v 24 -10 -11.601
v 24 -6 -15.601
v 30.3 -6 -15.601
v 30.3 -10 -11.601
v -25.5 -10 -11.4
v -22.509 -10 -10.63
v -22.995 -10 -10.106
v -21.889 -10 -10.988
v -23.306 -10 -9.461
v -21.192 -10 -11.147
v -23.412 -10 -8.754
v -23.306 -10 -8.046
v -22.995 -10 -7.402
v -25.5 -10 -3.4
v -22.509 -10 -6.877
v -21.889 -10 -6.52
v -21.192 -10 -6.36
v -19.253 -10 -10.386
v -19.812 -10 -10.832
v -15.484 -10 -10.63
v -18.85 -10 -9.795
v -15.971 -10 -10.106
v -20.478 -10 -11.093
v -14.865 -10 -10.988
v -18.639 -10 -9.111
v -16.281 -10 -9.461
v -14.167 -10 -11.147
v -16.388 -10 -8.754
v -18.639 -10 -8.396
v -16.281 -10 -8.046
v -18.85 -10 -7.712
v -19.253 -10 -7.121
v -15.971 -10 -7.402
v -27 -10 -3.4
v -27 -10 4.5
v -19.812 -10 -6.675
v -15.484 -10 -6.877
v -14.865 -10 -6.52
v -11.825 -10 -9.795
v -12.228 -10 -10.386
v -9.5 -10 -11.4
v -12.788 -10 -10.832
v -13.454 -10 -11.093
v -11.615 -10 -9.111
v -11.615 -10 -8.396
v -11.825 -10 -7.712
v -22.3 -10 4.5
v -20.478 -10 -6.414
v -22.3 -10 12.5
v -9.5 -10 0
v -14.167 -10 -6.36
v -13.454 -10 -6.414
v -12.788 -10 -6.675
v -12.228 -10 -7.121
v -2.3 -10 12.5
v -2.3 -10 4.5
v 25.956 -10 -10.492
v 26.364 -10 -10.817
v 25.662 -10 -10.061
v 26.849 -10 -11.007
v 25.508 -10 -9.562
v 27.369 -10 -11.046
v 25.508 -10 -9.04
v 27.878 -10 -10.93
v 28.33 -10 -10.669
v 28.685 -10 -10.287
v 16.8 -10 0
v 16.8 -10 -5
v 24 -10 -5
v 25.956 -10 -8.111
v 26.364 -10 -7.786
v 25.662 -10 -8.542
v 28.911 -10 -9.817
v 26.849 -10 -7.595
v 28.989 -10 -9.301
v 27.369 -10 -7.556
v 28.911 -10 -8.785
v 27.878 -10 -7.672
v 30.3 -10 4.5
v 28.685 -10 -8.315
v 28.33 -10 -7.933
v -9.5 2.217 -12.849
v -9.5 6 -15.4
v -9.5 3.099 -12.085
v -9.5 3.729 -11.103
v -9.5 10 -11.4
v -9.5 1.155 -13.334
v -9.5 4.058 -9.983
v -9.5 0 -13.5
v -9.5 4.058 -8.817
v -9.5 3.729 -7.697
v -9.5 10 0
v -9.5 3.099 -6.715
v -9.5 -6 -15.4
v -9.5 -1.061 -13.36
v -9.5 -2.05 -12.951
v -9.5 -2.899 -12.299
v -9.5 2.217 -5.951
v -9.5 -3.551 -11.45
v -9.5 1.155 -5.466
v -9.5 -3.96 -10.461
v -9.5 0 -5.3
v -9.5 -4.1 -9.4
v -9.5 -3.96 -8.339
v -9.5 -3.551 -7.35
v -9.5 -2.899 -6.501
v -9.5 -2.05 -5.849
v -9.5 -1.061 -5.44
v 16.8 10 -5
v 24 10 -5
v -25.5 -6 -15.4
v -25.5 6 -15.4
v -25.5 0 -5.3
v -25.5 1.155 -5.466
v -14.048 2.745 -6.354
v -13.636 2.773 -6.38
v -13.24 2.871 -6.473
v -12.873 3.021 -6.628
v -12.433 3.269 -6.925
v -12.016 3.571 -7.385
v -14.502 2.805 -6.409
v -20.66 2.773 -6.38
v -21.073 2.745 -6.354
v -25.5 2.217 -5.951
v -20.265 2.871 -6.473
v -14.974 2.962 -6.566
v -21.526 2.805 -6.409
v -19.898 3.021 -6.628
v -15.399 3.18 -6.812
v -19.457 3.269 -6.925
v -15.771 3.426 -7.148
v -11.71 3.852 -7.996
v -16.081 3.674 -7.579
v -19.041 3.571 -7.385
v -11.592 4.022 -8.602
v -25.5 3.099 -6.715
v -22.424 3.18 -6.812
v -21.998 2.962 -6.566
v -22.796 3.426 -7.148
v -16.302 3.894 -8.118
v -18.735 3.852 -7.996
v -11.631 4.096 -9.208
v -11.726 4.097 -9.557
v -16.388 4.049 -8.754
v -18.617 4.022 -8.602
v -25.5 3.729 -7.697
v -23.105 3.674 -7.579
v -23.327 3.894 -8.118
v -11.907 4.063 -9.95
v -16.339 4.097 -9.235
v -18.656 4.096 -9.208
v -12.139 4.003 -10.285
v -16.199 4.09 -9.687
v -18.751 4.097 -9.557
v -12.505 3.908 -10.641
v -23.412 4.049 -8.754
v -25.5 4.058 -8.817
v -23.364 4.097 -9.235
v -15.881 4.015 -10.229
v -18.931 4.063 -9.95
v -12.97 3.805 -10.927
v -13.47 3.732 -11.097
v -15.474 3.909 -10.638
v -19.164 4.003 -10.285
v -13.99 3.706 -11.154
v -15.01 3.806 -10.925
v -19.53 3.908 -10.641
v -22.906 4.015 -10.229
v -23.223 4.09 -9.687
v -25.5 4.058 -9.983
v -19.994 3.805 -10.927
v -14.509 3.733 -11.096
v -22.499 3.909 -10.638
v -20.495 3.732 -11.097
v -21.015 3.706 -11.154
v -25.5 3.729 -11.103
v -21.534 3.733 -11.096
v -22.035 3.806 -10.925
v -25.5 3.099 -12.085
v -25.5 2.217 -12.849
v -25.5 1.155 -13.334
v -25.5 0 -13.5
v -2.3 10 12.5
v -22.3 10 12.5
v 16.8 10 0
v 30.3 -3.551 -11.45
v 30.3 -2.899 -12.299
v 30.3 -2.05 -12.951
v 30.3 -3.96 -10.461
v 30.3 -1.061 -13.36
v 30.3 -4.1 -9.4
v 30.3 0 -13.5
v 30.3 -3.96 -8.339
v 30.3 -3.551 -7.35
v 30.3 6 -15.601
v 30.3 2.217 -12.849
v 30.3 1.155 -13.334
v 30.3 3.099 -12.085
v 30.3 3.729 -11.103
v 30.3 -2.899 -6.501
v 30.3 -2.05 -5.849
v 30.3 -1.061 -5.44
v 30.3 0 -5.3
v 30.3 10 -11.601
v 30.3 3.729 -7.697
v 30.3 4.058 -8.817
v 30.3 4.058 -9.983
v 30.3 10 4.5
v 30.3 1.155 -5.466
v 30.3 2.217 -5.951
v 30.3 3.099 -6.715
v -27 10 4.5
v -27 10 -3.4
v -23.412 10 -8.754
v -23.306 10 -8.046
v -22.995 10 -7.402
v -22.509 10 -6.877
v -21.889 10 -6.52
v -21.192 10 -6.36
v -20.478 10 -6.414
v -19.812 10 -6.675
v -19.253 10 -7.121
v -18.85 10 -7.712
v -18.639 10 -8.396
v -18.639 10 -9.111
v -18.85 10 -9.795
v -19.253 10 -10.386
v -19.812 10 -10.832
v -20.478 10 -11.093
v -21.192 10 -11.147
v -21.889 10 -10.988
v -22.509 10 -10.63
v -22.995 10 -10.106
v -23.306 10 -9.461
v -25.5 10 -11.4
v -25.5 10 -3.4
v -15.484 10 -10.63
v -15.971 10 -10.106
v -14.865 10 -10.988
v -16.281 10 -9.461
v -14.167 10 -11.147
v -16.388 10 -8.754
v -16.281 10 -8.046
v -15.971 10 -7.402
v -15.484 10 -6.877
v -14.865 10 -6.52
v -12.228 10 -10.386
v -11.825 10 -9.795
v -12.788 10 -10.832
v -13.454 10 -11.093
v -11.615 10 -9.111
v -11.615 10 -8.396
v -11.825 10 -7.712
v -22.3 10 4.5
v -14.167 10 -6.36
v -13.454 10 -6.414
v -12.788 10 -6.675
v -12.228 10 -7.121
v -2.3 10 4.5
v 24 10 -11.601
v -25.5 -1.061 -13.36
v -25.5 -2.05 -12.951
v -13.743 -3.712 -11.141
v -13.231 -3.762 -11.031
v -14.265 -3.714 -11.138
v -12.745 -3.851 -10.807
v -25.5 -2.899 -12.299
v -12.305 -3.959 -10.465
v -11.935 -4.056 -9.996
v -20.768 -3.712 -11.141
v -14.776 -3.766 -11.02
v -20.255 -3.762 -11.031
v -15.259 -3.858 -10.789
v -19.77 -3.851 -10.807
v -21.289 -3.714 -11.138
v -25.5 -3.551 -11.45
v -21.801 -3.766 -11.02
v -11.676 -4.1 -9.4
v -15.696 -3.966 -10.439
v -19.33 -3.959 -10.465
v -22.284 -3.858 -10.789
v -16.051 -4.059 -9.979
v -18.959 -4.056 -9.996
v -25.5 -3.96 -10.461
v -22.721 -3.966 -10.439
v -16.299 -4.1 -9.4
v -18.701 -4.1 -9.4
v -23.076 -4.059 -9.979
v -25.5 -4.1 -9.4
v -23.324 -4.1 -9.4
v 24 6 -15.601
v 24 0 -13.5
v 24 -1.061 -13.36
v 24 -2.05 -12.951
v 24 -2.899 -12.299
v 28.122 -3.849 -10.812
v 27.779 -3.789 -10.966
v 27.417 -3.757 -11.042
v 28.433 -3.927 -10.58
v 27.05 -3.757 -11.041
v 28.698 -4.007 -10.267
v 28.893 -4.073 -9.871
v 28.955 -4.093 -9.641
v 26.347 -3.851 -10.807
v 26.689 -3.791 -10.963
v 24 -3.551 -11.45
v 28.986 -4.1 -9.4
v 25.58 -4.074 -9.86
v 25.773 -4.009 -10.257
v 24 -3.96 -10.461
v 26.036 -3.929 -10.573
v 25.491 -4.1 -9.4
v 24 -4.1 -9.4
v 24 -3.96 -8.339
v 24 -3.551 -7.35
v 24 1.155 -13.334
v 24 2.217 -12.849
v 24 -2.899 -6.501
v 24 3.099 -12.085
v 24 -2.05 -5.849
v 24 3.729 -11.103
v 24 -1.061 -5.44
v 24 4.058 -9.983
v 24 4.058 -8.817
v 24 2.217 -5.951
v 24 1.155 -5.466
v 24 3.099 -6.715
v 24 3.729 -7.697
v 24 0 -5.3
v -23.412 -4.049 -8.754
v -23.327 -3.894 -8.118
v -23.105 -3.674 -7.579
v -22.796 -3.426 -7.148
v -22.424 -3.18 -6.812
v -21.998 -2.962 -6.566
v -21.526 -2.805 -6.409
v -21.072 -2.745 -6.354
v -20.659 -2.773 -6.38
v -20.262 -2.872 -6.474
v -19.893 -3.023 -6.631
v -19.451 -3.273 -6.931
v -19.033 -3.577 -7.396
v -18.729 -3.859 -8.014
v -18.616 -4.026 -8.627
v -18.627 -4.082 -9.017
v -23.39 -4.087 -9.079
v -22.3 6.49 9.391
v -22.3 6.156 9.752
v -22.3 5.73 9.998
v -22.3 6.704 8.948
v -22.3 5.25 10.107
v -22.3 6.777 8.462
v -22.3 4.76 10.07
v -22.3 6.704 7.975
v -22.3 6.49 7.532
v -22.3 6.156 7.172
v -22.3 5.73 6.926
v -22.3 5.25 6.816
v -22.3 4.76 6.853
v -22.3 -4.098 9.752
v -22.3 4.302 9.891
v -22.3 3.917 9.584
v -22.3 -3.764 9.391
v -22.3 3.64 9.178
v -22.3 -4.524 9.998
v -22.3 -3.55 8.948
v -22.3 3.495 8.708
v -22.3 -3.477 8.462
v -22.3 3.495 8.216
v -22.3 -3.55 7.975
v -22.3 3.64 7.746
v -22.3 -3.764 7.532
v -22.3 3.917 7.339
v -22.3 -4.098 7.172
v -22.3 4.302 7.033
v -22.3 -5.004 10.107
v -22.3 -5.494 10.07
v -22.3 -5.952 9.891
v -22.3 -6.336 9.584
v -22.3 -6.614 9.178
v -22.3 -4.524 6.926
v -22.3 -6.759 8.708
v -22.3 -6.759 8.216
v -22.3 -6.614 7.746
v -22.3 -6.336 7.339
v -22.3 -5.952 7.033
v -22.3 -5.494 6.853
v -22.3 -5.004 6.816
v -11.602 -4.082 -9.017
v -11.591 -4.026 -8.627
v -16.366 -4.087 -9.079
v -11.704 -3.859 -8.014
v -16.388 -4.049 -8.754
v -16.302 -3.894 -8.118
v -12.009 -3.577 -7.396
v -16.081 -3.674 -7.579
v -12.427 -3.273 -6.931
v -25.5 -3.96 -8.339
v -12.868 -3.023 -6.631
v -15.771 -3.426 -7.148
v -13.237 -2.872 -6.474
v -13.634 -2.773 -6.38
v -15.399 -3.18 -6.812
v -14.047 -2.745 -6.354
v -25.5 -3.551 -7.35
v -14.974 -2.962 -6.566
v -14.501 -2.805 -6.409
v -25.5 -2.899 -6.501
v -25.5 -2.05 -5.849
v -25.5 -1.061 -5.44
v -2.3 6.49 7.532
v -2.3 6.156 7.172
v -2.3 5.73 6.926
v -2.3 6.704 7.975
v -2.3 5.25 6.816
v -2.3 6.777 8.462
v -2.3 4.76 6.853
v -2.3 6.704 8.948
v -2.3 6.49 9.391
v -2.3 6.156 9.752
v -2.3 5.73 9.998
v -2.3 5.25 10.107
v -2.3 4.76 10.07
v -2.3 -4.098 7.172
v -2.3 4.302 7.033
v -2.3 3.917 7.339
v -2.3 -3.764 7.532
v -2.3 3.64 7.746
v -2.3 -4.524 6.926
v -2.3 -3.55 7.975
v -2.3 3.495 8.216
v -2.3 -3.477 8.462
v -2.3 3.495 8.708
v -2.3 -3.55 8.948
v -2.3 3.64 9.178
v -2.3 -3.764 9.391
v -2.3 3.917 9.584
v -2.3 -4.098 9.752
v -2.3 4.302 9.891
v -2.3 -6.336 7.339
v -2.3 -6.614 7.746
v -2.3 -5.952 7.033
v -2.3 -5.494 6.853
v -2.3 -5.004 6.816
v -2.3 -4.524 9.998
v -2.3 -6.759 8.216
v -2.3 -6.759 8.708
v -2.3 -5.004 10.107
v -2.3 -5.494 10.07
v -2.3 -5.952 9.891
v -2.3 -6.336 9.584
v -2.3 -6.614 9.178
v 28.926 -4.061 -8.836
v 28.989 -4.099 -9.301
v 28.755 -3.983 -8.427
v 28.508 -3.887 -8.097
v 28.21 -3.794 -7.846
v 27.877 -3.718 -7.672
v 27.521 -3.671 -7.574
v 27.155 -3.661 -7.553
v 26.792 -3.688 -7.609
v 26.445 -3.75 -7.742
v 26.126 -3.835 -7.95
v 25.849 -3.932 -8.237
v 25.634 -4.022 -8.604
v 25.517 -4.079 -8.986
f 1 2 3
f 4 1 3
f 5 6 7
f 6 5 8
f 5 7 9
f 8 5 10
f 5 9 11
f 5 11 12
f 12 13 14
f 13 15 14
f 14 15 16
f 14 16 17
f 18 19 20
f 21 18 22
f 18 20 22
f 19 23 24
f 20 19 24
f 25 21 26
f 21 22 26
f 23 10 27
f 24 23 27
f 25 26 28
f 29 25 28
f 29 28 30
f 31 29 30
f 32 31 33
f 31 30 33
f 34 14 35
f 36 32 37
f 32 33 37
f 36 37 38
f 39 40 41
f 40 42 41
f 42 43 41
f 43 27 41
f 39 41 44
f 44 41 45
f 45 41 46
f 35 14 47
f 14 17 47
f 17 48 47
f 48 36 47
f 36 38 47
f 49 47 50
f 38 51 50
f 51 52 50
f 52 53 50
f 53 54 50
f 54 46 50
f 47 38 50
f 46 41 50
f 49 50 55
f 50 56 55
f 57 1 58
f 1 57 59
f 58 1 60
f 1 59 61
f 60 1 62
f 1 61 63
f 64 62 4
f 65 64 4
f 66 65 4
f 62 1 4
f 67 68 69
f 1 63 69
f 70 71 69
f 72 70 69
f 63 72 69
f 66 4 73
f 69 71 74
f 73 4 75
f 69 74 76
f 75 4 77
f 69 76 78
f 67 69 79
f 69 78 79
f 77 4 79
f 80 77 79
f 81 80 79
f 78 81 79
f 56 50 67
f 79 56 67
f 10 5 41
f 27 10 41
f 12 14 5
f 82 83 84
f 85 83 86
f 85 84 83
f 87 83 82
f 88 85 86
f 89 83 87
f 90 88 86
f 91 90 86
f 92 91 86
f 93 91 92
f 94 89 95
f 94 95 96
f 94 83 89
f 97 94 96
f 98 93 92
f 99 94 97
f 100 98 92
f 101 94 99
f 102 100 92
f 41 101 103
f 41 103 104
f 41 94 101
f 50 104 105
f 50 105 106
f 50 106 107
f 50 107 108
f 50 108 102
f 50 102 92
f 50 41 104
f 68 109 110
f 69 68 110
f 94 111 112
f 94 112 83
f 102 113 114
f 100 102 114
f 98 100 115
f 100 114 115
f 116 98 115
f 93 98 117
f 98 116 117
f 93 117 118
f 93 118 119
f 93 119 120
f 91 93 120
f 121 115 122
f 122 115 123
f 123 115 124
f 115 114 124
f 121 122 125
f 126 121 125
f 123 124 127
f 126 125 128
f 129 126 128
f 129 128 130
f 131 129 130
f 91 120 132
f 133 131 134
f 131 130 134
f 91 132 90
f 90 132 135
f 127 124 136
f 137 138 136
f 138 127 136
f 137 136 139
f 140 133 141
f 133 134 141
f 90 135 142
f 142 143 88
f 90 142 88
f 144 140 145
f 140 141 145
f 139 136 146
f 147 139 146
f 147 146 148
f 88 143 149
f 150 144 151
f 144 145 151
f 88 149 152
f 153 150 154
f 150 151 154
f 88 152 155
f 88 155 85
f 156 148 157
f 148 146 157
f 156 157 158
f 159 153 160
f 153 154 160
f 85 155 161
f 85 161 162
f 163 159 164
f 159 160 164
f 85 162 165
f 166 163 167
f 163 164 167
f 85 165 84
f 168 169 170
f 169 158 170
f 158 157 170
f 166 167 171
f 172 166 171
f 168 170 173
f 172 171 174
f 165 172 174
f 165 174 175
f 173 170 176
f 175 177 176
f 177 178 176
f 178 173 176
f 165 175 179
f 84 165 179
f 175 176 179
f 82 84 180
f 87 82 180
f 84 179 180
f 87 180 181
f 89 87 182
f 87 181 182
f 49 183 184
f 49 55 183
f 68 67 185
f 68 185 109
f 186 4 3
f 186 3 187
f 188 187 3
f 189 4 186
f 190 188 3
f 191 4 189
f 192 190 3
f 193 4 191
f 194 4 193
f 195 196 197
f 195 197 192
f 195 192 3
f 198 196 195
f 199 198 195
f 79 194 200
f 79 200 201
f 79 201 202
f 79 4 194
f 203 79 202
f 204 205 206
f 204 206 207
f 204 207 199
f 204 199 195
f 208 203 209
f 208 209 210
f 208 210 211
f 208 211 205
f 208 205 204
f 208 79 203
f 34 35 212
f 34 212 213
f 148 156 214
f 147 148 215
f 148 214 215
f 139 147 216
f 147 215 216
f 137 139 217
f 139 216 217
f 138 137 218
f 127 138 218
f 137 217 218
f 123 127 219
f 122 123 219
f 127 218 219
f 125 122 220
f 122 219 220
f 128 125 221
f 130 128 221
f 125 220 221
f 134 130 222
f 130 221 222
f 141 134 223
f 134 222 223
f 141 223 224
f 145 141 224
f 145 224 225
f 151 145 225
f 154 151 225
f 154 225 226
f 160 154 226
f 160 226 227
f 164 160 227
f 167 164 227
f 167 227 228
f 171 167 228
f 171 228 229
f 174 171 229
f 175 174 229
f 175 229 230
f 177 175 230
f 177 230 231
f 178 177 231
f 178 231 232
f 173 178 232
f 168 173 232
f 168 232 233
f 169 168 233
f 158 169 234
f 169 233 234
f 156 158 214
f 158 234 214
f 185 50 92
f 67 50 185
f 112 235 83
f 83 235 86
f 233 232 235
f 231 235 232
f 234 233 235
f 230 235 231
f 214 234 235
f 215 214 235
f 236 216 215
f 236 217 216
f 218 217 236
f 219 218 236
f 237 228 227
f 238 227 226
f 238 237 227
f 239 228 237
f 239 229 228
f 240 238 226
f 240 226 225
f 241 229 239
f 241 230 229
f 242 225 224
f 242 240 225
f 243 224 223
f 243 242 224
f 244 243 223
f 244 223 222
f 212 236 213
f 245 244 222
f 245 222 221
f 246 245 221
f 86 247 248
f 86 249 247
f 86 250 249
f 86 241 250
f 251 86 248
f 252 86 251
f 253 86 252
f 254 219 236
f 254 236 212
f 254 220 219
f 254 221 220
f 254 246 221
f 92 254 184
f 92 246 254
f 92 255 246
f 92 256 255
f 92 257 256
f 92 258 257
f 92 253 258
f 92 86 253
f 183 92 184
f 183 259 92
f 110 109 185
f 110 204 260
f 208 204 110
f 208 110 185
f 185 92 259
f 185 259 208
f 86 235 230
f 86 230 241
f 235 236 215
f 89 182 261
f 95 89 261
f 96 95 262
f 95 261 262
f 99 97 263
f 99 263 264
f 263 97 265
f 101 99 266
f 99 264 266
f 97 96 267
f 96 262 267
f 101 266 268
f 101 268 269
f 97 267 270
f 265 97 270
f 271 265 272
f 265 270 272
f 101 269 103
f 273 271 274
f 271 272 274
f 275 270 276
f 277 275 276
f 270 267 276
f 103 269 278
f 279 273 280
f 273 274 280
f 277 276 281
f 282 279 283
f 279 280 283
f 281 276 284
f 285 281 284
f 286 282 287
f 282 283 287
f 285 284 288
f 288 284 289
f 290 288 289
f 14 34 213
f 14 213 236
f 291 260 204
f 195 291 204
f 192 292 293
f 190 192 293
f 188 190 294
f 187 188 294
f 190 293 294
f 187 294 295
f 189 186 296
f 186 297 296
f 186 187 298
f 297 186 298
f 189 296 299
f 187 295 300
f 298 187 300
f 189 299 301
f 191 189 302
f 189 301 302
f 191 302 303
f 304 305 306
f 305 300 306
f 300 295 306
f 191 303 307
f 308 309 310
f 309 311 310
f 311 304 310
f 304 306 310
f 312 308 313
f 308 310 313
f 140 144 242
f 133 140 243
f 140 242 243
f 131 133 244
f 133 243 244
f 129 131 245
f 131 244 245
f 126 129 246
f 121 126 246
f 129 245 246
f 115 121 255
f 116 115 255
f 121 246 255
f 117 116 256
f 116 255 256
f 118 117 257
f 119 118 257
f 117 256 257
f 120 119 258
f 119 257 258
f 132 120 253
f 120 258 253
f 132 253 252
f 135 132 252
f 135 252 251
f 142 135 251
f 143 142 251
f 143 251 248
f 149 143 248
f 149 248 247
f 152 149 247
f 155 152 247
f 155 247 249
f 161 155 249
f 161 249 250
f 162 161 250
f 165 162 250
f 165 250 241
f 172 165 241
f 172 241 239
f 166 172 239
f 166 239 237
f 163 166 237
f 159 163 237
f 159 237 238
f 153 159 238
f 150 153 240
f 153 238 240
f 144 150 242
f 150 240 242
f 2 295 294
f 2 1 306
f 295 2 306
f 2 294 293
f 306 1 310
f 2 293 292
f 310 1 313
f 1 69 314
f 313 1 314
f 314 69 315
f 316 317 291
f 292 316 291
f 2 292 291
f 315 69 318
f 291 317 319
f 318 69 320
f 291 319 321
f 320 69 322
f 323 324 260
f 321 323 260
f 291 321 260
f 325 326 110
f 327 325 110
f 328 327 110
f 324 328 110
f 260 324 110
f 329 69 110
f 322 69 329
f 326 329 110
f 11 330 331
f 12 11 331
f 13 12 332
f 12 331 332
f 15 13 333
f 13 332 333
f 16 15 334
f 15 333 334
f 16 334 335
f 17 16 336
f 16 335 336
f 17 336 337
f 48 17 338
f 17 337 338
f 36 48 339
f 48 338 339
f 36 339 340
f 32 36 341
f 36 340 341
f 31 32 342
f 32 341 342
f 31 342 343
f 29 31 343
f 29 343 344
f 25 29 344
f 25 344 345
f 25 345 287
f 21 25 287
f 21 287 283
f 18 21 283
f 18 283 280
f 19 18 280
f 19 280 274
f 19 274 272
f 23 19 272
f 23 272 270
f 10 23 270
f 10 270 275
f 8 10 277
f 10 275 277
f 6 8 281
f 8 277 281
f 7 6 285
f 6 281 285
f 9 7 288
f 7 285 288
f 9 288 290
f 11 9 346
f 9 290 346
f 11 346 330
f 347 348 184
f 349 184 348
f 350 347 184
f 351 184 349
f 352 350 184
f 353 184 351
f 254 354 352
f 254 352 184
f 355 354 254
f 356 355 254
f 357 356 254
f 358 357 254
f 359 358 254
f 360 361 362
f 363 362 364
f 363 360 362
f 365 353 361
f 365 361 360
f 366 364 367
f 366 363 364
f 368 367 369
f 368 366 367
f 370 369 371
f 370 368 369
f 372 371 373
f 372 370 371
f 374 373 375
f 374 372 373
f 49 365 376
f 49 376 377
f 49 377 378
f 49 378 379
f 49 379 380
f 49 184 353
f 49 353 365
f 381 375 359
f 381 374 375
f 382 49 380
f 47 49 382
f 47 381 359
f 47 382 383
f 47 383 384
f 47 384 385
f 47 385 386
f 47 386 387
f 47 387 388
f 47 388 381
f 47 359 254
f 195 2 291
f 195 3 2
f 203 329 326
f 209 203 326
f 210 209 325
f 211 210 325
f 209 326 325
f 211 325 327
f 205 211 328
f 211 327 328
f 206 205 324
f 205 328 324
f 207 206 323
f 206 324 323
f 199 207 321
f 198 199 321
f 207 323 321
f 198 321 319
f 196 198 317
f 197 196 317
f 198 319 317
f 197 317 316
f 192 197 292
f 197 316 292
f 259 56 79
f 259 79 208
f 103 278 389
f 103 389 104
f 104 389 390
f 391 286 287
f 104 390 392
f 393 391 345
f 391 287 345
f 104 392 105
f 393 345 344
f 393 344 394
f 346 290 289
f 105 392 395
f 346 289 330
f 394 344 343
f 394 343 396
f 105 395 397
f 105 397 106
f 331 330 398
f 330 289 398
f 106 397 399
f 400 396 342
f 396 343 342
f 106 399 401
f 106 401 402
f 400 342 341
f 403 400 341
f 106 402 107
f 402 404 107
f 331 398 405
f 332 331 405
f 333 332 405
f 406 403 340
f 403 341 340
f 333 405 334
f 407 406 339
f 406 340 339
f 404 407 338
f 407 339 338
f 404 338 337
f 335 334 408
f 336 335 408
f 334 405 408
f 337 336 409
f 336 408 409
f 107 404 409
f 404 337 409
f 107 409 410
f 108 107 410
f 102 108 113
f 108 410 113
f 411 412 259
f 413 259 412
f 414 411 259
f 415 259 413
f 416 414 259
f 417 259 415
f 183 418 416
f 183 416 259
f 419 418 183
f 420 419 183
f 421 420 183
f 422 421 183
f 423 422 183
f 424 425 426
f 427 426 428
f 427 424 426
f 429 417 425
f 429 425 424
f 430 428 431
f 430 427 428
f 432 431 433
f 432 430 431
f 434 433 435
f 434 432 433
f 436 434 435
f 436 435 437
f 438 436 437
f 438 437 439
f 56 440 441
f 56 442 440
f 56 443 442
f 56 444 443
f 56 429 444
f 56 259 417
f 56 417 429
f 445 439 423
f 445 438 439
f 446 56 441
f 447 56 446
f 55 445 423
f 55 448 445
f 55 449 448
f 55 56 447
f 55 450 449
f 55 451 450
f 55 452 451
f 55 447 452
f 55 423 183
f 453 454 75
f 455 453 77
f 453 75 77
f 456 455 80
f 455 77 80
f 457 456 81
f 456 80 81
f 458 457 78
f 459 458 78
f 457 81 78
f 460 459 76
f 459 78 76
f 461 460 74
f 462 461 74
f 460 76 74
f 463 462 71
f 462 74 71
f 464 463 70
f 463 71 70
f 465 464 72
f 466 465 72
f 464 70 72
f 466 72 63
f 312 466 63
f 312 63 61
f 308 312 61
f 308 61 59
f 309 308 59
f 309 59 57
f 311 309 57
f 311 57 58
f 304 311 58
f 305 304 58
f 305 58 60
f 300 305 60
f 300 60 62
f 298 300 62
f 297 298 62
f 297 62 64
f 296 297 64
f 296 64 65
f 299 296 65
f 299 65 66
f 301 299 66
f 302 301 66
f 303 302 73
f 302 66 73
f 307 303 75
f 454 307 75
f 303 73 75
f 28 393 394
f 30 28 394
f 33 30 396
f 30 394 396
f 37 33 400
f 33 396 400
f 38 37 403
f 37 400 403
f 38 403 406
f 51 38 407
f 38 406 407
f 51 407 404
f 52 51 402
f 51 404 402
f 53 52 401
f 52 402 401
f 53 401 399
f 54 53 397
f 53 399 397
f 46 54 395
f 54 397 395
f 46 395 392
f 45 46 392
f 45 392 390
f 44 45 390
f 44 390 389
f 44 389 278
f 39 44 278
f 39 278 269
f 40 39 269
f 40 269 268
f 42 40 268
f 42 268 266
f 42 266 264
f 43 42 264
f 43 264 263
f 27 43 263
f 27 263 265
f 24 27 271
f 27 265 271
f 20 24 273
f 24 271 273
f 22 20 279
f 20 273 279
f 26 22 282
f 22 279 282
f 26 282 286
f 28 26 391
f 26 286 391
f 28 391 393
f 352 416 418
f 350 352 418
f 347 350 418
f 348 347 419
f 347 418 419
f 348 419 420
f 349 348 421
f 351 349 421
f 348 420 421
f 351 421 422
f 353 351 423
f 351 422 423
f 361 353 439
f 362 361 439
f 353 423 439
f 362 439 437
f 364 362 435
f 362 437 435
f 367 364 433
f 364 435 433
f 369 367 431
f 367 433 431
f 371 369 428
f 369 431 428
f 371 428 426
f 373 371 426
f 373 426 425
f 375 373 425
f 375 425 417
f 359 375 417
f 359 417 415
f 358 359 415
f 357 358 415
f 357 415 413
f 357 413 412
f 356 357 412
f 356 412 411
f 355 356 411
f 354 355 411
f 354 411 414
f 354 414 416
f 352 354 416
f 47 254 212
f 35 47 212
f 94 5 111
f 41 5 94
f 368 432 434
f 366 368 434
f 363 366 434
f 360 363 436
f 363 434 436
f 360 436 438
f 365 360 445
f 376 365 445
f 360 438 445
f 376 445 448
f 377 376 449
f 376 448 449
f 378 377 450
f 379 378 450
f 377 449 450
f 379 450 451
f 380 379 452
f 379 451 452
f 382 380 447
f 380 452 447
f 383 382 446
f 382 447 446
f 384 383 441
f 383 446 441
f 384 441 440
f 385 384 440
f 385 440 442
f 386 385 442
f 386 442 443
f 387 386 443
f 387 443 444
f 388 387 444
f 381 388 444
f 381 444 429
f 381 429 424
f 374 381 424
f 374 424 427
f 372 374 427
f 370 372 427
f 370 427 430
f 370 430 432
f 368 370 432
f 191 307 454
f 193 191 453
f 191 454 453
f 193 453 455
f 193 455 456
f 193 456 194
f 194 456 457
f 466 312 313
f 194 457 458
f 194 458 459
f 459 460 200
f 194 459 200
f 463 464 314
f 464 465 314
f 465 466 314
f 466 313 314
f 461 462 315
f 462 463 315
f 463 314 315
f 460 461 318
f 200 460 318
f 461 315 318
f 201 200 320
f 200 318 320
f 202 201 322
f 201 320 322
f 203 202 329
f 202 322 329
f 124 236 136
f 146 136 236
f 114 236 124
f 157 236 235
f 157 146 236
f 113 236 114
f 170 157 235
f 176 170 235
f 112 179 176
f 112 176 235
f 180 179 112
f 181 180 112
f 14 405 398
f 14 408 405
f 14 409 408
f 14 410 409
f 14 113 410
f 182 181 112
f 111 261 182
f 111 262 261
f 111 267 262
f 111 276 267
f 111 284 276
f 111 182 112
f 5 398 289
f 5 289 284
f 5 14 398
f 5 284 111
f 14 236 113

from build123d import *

# Parameters (mm, degrees)
F1_DEPTH      = 10
F2_SIZE       = 4
F4_W          = 20
F4_H          = 20.101140447
F5_DEPTH      = 3.3
F5_DEPTH_BACK = 3
F6_DEPTH      = 84
F7_SIZE       = 4
F8_R          = 1.75
F9_DEPTH      = 8.7
F10_R         = 1.65
F11_DEPTH     = 66.9
F12_R         = 2.4
F13_DEPTH     = 25


with BuildPart() as f1:
    # F0 (on Front) → F1 (new body, symmetric)
    with BuildSketch(Plane.XZ):
        Polygon((-22.3, 4.5), (-27, 4.5), (-27, -3.4), (-25.5, -3.4), (-25.5, -15.4), (-9.5, -15.4), (-9.5, 0), (16.8, 0), (16.8, -5), (27, -5), (27, 0), (27, 4.5), (-2.3, 4.5), (-2.3, 12.5), (-22.3, 12.5), align=None)
    extrude(amount=F1_DEPTH, both=True)

    # F2
    f2_edges = [f1.edges().sort_by_distance(p)[0] for p in [
        (-17.5, -10, -15.4),
        (-17.5, 10, -15.4),
    ]]
    chamfer(f2_edges, length=F2_SIZE)

    # F4 (on face) → F5 (join, two sides)
    with BuildSketch(Plane.YZ.offset(27)) as f5_sk:
        with Locations((0, -5.5505702235)):
            Rectangle(F4_W, F4_H)
    extrude(amount=F5_DEPTH)
    extrude(f5_sk.sketch, amount=-F5_DEPTH_BACK)

    # F3 (on face) → F6 (cut)
    with BuildSketch(Plane(origin=(-25.5, 0, 0), x_dir=(0, -1, 0), z_dir=(-1, 0, 0))):
        with BuildLine():
            ThreePointArc((4.1, -9.4), (2.8991378029, -6.5008621971), (0, -5.3))
            Line((0, -5.3), (0, -13.5))
            ThreePointArc((0, -13.5), (2.8991378029, -12.2991378029), (4.1, -9.4))
        make_face()
        with BuildLine():
            Line((0, -13.5), (0, -5.3))
            ThreePointArc((0, -5.3), (-4.1, -9.4), (0, -13.5))
        make_face()
    extrude(amount=-F6_DEPTH, mode=Mode.SUBTRACT)

    # F7
    f7_edges = [f1.edges().sort_by_distance(p)[0] for p in [
        (27.15, 10, -15.60114),
        (27.15, -10, -15.60114),
    ]]
    chamfer(f7_edges, length=F7_SIZE)

    # F8 (on face) → F9 (cut)
    with BuildSketch(Plane.XZ.offset(10)):
        with Locations((27.2387061268, -9.3012042344)):
            Circle(F8_R)
    extrude(amount=-F9_DEPTH, mode=Mode.SUBTRACT)

    # F10 (on face) → F11 (cut)
    with BuildSketch(Plane.YZ.offset(30.3)):
        with Locations((5.1269349642, 8.461603526)):
            Circle(F10_R)
        with Locations((-5.1269349642, 8.461603526)):
            Circle(F10_R)
    extrude(amount=-F11_DEPTH, mode=Mode.SUBTRACT)

    # F12 (on face) → F13 (cut)
    with BuildSketch(Plane(origin=(0, 10, 0), x_dir=(-1, 0, 0), z_dir=(0, 1, 0))):
        with Locations((21.0122950375, -8.7536005303)):
            Circle(F12_R)
        with Locations((13.9877049625, -8.7536005303)):
            Circle(F12_R)
    extrude(amount=-F13_DEPTH, mode=Mode.SUBTRACT)


solid = f1.part
